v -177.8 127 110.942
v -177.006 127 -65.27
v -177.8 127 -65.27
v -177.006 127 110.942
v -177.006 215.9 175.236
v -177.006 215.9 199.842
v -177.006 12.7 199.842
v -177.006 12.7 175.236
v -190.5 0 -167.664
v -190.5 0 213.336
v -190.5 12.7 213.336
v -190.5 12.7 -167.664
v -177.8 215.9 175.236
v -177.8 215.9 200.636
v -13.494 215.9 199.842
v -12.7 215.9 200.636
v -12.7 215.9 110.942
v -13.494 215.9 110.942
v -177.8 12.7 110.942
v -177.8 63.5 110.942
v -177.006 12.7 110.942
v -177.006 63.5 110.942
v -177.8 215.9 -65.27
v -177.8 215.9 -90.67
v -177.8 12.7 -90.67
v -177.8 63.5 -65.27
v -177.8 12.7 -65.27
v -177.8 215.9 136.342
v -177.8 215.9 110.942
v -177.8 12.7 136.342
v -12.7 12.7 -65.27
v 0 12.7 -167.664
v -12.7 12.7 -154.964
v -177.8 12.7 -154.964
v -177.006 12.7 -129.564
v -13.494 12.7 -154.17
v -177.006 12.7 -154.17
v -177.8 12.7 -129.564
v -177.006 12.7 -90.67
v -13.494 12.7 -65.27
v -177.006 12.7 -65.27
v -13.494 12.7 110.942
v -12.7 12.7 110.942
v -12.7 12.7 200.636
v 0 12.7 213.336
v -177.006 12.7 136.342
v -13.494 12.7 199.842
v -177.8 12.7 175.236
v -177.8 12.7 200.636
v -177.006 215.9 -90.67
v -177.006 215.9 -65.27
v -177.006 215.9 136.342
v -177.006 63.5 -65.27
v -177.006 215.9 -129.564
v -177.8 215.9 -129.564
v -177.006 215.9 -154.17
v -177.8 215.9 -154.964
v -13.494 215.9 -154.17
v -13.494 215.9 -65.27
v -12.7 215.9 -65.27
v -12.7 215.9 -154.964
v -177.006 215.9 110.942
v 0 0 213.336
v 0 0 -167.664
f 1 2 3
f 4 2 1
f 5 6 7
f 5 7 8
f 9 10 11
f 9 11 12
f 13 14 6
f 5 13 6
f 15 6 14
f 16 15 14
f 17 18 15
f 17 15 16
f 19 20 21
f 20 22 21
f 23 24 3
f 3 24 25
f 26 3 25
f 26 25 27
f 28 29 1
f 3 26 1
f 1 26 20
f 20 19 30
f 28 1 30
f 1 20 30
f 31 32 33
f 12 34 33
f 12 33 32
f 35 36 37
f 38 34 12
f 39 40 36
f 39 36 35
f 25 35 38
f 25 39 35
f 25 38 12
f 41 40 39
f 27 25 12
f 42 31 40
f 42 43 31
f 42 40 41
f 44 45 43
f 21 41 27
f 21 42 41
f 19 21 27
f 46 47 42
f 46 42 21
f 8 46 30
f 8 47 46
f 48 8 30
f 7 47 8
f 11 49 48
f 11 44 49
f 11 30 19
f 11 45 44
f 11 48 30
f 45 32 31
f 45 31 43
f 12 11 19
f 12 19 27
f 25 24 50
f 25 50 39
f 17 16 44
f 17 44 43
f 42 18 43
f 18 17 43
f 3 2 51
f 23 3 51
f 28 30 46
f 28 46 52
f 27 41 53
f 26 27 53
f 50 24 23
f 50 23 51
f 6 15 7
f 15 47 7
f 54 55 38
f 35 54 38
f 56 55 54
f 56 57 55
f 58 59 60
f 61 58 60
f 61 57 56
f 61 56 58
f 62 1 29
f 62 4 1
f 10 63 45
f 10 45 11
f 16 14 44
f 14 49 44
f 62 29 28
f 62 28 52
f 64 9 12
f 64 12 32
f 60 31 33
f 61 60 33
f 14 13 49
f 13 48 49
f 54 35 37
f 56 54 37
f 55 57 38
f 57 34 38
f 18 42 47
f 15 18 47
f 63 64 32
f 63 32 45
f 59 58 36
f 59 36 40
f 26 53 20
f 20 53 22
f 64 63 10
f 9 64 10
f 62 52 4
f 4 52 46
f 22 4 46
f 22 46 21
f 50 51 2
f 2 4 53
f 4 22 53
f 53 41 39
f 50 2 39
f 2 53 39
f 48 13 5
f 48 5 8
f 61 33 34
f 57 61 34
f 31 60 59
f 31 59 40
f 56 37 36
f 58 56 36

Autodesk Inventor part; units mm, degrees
ref_plane "YZ Plane" through (0, 0, 0) normal (1, 0, 0) x (0, 1, 0)
ref_plane "XZ Plane" through (0, 0, 0) normal (0, 1, 0) x (-1, 0, 0)
ref_plane "XY Plane" through (0, 0, 0) normal (0, 0, 1) x (1, 0, 0)
sketch "Sketch1" plane through (0, 0, 0) normal (0, 1, 0) x (-1, 0, 0)
  line L0 (0, 213.3361) -> (190.5, 213.3361)
  line L1 (190.5, 213.3361) -> (190.5, -167.6639)
  line L2 (190.5, -167.6639) -> (0, -167.6639)
  line L3 (0, -167.6639) -> (0, 213.3361)
  point P0 (0, 0)
  dimension "d0" = 190.5
  dimension "d1" = 381
extrude "Extrusion1" add sketch "Sketch1" along normal blind 12.7
sketch "Sketch2" plane through (0, 12.7, 0) normal (0, 1, 0) x (1, 0, 0)
  line L0 (0, -213.3361) -> (-190.5, -213.3361)
  line L1 (-190.5, -213.3361) -> (-190.5, 167.6639)
  line L2 (-190.5, 167.6639) -> (0, 167.6639)
  line L3 (0, 167.6639) -> (0, -213.3361)
  line L4 (-177.8, 154.9639) -> (-177.8, -200.6361)
  line L5 (-177.8, -200.6361) -> (-12.7, -200.6361)
  line L6 (-12.7, -200.6361) -> (-12.7, 154.9639)
  line L7 (-12.7, 154.9639) -> (-177.8, 154.9639)
  line L8 (-177.0062, -199.8424) -> (-177.0062, 154.1701)
  line L9 (-177.0062, 154.1701) -> (-13.4938, 154.1701)
  line L10 (-13.4938, 154.1701) -> (-13.4938, -199.8424)
  line L11 (-13.4938, -199.8424) -> (-177.0062, -199.8424)
  point P0 (0, 0)
  dimension "d4" = 12.7
  dimension "d5" = 0.7937
extrude "Extrusion2" add sketch "Sketch2" along normal blind 203.2 contours L7 L6 L5 L4
sketch "Sketch3" plane through (-12.7, 12.7, 200.6361) normal (1, 0, 0) x (0, 0, -1)
  line L0 (354.8062, 203.2) -> (265.9062, 203.2)
  line L1 (265.9062, 203.2) -> (265.9062, 0)
  line L2 (265.9062, 0) -> (354.8062, 0)
  line L3 (354.8062, 0) -> (354.8062, 203.2)
  line L4 (354.8062, 0) -> (0.7938, 0) projected
  line L5 (0.7938, 203.2) -> (89.6938, 203.2)
  line L6 (89.6938, 203.2) -> (89.6938, 0)
  line L7 (89.6938, 0) -> (0.7938, 0)
  line L8 (0.7938, 0) -> (0.7938, 203.2)
  line L9 (89.6938, 203.2) -> (265.9062, 203.2)
  line L10 (265.9062, 203.2) -> (265.9062, 0)
  line L11 (265.9062, 0) -> (89.6938, 0)
  line L12 (89.6938, 0) -> (89.6938, 203.2)
  point P0 (200.6361, -12.7)
  point P1 (0, 203.2)
  dimension "d9" = 88.9
  dimension "d10" = 88.9
extrude "Extrusion3" cut sketch "Sketch3" against normal blind 50.8 contours L1 L4 L6 L9
sketch "Sketch4" plane through (-177.0062, 12.7, 199.8424) normal (1, 0, 0) x (0, 0, -1)
  line L0 (265.1125, 0) -> (265.1125, 203.2) projected
  line L1 (88.9, 0) -> (265.1125, 0)
  line L2 (265.1125, 0) -> (265.1125, 50.8)
  line L3 (265.1125, 50.8) -> (88.9, 50.8)
  line L4 (88.9, 50.8) -> (88.9, 0)
  line L5 (88.9, 203.2) -> (265.1125, 203.2)
  line L6 (265.1125, 203.2) -> (265.1125, 114.3)
  line L7 (265.1125, 114.3) -> (88.9, 114.3)
  line L8 (88.9, 114.3) -> (88.9, 203.2)
  point P0 (199.8424, -12.7)
  dimension "d13" = 50.8
  dimension "d14" = 88.9
extrude "Extrusion4" cut sketch "Sketch4" against normal blind 50.8
sketch "Sketch5" plane through (-177.8, 12.7, 200.6361) normal (-1, 0, 0) x (0, 0, 1)
  line L0 (-265.9062, 114.3) -> (-265.9062, 203.2) projected
  line L1 (-355.6, 0) -> (-355.6, 203.2) projected
  line L2 (-368.3, 0) -> (12.7, 0) projected
  line L3 (-355.6, 203.2) -> (-330.2, 203.2)
  line L4 (-330.2, 203.2) -> (-330.2, 0)
  line L5 (-330.2, 0) -> (-355.6, 0)
  line L6 (-355.6, 0) -> (-355.6, 203.2)
  line L7 (-265.9062, 203.2) -> (-291.3062, 203.2)
  line L8 (-291.3062, 203.2) -> (-291.3062, 0)
  line L9 (-291.3062, 0) -> (-265.9062, 0)
  line L10 (-265.9062, 0) -> (-265.9062, 203.2)
  line L11 (-330.2, 203.2) -> (-291.3062, 203.2)
  line L12 (-291.3062, 203.2) -> (-291.3062, 0)
  line L13 (-291.3062, 0) -> (-330.2, 0)
  line L14 (-330.2, 0) -> (-330.2, 203.2)
  point P0 (-200.6361, -12.7)
  dimension "d17" = 89.6937
  dimension "d18" = 25.4
  dimension "d19" = 25.4
extrude "Extrusion5" cut sketch "Sketch5" against normal blind 25.4 contours L8 L2 L4 L11
sketch "Sketch6" plane through (-177.8, 12.7, 200.6361) normal (-1, 0, 0) x (0, 0, 1)
  line L0 (-89.6938, 114.3) -> (-265.9062, 114.3) projected
  line L1 (0, 0) -> (-89.6938, 0) projected
  line L2 (0, 203.2) -> (-25.4, 203.2)
  line L3 (-25.4, 203.2) -> (-25.4, 0)
  line L4 (-25.4, 0) -> (0, 0)
  line L5 (0, 0) -> (0, 203.2)
  line L6 (-89.6938, 203.2) -> (0, 203.2) projected
  line L7 (-89.6938, 0) -> (-64.2938, 0)
  line L8 (-64.2938, 0) -> (-64.2938, 203.2)
  line L9 (-64.2938, 203.2) -> (-89.6938, 203.2)
  line L10 (-89.6938, 203.2) -> (-89.6938, 0)
  line L11 (-64.2938, 203.2) -> (-25.4, 203.2)
  line L12 (-25.4, 203.2) -> (-25.4, 0)
  line L13 (-25.4, 0) -> (-64.2938, 0)
  line L14 (-64.2938, 0) -> (-64.2938, 203.2)
  line L15 (-64.2938, 203.2) -> (-25.4, 203.2)
  line L16 (-25.4, 203.2) -> (-25.4, 0)
  line L17 (-25.4, 0) -> (-64.2938, 0)
  line L18 (-64.2938, 0) -> (-64.2938, 203.2)
  point P0 (-200.6361, -12.7)
  dimension "d22" = 25.4
  dimension "d23" = 25.4
extrude "Extrusion6" cut sketch "Sketch6" against normal blind 25.4 contours L1 L8 L6 L3
properties part number "soccer_goal.ipj"
